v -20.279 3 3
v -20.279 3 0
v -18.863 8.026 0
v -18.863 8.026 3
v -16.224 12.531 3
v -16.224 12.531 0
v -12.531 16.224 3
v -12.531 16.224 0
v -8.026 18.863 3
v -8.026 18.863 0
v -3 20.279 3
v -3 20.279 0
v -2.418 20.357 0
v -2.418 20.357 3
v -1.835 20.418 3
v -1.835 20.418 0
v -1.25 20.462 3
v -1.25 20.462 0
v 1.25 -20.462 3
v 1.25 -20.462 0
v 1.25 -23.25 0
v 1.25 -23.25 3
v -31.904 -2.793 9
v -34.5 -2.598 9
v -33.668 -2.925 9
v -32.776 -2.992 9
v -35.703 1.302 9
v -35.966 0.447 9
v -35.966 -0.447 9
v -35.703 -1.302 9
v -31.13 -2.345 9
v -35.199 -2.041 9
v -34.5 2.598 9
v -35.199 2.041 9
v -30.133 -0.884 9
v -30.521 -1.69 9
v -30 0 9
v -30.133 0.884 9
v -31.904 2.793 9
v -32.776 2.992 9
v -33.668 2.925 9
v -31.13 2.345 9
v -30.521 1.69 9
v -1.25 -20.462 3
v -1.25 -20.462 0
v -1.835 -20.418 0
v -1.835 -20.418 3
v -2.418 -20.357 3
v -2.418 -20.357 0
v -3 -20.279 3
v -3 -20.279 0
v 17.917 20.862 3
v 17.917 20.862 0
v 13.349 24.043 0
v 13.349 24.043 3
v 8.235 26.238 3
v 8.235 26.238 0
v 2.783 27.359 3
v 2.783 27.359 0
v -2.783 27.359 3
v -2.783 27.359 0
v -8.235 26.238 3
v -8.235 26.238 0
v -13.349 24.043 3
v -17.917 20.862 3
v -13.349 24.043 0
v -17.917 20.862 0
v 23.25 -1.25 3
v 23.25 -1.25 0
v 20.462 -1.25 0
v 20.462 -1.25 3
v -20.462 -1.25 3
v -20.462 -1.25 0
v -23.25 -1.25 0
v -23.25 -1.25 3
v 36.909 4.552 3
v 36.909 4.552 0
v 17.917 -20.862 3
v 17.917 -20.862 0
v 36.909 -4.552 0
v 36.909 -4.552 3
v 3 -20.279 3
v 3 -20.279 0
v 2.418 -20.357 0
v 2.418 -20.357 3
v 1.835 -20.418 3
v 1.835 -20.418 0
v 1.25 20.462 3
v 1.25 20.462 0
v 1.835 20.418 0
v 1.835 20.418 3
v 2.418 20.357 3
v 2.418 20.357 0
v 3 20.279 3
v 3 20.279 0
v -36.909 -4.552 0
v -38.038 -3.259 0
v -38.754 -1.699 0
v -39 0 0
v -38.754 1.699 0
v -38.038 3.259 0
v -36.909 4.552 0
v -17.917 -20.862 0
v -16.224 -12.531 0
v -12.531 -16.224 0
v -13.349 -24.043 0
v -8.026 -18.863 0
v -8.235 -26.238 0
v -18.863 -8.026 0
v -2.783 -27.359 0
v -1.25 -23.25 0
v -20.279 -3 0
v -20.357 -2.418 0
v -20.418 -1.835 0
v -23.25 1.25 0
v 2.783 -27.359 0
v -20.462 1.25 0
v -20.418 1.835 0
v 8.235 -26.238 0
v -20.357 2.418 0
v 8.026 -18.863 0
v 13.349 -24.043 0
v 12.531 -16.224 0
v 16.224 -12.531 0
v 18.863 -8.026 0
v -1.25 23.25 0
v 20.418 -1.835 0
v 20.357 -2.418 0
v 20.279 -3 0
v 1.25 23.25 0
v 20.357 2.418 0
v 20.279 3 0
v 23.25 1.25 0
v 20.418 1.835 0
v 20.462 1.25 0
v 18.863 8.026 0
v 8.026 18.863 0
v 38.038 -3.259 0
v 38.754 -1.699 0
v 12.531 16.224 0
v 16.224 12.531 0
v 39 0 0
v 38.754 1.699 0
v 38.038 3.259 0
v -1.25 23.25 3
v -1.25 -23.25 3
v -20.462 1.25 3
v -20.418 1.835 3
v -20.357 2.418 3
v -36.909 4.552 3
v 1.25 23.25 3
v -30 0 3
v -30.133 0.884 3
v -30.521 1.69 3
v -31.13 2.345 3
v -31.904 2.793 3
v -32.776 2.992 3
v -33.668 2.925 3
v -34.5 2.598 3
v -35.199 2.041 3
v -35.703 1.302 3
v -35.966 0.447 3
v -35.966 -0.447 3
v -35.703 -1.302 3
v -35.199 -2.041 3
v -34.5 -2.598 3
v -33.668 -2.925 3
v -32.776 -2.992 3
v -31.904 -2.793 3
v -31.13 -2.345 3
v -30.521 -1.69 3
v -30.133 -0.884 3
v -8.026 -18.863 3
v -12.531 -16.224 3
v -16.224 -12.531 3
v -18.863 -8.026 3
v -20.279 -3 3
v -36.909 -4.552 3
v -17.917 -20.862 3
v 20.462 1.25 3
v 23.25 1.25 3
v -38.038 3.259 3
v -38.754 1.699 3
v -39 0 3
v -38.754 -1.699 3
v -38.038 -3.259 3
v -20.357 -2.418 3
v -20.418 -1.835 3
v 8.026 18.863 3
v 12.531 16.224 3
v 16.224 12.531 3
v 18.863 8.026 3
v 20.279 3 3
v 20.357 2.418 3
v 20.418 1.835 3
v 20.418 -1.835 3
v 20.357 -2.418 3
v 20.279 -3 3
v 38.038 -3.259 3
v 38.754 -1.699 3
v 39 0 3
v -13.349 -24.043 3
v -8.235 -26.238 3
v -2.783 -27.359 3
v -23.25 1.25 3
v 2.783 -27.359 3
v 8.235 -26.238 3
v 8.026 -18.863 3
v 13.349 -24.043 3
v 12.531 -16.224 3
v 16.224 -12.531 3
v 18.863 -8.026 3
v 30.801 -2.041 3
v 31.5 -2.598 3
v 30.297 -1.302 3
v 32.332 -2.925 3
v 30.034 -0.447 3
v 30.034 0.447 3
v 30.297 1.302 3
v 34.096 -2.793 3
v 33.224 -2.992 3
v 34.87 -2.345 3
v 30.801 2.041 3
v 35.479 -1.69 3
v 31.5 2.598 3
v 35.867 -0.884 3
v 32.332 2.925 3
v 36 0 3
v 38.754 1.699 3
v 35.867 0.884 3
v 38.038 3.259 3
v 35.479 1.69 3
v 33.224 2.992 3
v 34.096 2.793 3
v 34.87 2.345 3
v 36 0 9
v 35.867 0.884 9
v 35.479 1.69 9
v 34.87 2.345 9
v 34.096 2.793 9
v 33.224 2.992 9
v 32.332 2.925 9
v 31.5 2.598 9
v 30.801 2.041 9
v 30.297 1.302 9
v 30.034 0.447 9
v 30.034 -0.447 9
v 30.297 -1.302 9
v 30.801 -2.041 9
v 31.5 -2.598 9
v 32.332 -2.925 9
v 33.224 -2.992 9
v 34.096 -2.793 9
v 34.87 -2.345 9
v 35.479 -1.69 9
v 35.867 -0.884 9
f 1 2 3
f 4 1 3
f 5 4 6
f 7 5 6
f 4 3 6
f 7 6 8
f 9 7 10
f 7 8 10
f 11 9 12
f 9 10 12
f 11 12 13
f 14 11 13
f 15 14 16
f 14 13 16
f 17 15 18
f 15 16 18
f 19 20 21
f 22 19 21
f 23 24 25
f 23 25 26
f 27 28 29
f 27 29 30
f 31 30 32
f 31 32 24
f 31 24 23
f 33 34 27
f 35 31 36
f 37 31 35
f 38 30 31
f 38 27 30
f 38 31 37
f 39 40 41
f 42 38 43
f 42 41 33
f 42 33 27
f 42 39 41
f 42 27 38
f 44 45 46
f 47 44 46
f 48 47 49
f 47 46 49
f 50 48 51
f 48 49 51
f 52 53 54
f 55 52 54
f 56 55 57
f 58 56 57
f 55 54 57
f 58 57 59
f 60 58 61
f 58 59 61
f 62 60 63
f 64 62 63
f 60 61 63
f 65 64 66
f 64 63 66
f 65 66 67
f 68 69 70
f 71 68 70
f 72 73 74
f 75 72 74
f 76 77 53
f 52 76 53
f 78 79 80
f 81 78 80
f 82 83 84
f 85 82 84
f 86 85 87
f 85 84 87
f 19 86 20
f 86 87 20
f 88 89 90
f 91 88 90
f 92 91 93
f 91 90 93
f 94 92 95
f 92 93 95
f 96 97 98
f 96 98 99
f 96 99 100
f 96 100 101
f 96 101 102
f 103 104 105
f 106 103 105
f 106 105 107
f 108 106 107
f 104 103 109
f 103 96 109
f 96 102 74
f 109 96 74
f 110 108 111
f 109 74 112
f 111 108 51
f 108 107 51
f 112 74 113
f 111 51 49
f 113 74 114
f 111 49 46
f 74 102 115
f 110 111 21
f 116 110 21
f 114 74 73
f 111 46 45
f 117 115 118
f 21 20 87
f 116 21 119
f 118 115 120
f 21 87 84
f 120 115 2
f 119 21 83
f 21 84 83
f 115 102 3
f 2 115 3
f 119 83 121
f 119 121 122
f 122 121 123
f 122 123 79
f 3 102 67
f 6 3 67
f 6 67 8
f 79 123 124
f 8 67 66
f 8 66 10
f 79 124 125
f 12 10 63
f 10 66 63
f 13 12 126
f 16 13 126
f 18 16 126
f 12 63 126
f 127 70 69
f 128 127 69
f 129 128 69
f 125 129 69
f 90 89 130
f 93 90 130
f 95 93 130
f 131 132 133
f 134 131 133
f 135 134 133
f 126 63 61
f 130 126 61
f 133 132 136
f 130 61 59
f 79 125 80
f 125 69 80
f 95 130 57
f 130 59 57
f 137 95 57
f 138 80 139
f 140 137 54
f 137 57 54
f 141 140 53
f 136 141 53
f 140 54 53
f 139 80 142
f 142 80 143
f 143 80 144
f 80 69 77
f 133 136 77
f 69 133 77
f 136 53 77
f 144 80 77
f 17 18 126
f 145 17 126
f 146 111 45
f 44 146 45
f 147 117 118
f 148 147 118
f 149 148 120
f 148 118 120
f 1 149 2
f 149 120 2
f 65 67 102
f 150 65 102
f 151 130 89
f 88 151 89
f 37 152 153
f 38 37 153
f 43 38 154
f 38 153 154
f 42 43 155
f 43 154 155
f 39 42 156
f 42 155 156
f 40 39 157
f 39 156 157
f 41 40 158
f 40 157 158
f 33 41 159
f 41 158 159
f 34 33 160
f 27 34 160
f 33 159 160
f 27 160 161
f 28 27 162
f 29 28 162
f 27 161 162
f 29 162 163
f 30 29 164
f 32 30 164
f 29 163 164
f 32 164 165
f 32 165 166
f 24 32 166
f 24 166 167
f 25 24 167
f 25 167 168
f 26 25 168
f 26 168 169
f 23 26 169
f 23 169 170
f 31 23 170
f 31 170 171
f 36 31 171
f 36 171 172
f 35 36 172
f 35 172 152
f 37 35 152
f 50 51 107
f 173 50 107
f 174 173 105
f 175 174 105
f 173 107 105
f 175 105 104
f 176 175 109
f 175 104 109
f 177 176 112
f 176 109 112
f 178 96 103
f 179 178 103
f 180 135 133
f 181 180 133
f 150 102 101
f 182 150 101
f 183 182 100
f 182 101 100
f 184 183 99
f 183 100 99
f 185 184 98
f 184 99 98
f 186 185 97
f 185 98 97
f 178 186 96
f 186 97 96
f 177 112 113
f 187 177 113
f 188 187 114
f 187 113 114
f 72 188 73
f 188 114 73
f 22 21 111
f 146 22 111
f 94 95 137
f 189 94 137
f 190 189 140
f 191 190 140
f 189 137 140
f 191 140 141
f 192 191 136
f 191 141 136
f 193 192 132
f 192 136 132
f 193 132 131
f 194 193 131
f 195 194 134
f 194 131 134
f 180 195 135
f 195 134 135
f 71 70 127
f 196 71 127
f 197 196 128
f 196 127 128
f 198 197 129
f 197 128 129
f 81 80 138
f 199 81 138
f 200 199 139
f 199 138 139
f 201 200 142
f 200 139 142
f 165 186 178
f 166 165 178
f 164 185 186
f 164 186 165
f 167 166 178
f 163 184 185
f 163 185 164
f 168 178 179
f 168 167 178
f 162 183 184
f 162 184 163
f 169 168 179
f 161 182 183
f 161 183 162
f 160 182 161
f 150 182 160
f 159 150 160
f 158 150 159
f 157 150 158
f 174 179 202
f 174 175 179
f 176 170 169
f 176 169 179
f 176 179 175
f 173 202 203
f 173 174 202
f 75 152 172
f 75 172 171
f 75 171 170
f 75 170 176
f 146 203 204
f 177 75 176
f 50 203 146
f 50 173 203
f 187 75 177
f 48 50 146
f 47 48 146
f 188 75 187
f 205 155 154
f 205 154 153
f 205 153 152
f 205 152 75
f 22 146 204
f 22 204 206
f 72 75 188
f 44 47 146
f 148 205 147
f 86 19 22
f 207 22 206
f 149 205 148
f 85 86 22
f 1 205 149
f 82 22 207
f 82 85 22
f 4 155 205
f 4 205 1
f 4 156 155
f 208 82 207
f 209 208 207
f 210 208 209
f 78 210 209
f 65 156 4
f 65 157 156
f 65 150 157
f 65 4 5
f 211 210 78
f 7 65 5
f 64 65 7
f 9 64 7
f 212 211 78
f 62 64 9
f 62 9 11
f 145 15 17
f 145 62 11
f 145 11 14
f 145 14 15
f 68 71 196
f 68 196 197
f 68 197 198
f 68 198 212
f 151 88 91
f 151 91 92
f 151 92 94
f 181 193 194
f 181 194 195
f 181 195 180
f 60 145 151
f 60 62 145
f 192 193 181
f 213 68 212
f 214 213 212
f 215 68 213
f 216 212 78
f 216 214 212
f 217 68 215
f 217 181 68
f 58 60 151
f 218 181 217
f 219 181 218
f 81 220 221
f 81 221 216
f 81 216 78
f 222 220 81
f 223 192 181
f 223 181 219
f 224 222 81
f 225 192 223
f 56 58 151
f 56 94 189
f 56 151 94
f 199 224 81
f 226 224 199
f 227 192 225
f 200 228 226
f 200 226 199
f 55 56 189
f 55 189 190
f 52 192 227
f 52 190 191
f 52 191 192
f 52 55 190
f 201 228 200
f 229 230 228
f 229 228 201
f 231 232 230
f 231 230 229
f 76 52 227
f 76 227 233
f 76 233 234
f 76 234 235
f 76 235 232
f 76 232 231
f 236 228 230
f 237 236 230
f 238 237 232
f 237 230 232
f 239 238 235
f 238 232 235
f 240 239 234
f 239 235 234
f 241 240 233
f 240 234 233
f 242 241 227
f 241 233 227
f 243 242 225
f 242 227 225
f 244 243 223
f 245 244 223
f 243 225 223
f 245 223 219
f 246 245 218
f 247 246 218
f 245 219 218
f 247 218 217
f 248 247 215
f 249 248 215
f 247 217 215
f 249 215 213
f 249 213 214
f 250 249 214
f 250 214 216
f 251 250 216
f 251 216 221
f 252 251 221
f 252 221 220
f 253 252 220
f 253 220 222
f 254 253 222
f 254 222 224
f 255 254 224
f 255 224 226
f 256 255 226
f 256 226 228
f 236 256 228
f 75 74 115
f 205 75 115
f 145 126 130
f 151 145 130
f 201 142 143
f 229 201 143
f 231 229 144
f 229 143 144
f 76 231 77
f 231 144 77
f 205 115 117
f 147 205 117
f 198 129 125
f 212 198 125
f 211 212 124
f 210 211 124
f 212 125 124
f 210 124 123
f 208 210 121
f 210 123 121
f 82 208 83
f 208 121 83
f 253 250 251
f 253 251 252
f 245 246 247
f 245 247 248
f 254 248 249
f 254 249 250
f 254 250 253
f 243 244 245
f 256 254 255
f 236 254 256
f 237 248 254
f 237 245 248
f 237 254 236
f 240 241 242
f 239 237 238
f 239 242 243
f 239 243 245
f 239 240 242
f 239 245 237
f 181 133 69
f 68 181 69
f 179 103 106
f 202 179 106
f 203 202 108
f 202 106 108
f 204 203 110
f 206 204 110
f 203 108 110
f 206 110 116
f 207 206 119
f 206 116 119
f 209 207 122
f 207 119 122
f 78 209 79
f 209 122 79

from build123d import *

# Parameters (mm, degrees)
F0_R     = 3
F1_DEPTH = 3
F2_DEPTH = 9


with BuildPart() as f1:
    # F0 (on Top) → F1 (new body)
    with BuildSketch(Plane.XY):
        with BuildLine():
            ThreePointArc((27.4128787879, -2.1872532), (27, 0), (27.4128787879, 2.1872532))
            ThreePointArc((27.4128787879, 2.1872532), (24.5129138593, 12.4646321295), (17.916666852, 20.8624794527))
            ThreePointArc((17.916666852, 20.8624794527), (2.047e-07, 27.5), (-17.9166665414, 20.8624797195))
            ThreePointArc((-17.9166665414, 20.8624797195), (-24.5129137666, 12.464632312), (-27.4128787879, 2.1872532))
            ThreePointArc((-27.4128787879, 2.1872532), (-27.1041231665, 1.1129404133), (-27, 0))
            ThreePointArc((-27, 0), (-27.1041231665, -1.1129404133), (-27.4128787879, -2.1872532))
            ThreePointArc((-27.4128787879, -2.1872532), (-24.5129136468, -12.4646325475), (-17.9166661404, -20.8624800638))
            ThreePointArc((-17.9166661404, -20.8624800638), (2.794e-07, -27.5), (17.9166665643, -20.8624796998))
            ThreePointArc((17.9166665643, -20.8624796998), (24.5129137734, -12.4646322985), (27.4128787879, -2.1872532))
        make_face()
        with BuildLine():
            ThreePointArc((3, 20.2792997907), (14.4956890143, 14.4956890143), (20.2792997907, 3))
            Line((20.2792997907, 3), (25, 3))
            Line((25, 3), (25, -3))
            Line((25, -3), (20.2792997907, -3))
            ThreePointArc((20.2792997907, -3), (14.4956890143, -14.4956890143), (3, -20.2792997907))
            Line((3, -20.2792997907), (3, -25))
            Line((3, -25), (-3, -25))
            Line((-3, -25), (-3, -20.2792997907))
            ThreePointArc((-3, -20.2792997907), (-14.4956890143, -14.4956890143), (-20.2792997907, -3))
            Line((-20.2792997907, -3), (-25, -3))
            Line((-25, -3), (-25, 3))
            Line((-25, 3), (-20.2792997907, 3))
            ThreePointArc((-20.2792997907, 3), (-14.4956890143, 14.4956890143), (-3, 20.2792997907))
            Line((-3, 20.2792997907), (-3, 25))
            Line((-3, 25), (3, 25))
            Line((3, 25), (3, 20.2792997907))
        make_face(mode=Mode.SUBTRACT)
        with BuildLine():
            ThreePointArc((-27.4128787879, 2.1872532), (-24.5129137666, 12.464632312), (-17.9166665414, 20.8624797195))
            Line((-17.9166665414, 20.8624797195), (-36.9090909114, 4.5518137315))
            ThreePointArc((-36.9090909114, 4.5518137315), (-31.5502644899, 5.8222218225), (-27.4128787879, 2.1872532))
        make_face()
        with BuildLine():
            ThreePointArc((-27.4128787879, -2.1872532), (-27.5, 0), (-27.4128787879, 2.1872532))
            ThreePointArc((-27.4128787879, 2.1872532), (-31.5502644899, 5.8222218225), (-36.9090909114, 4.5518137315))
            ThreePointArc((-36.9090909114, 4.5518137315), (-39, 5.6e-09), (-36.9090909199, -4.5518137242))
            ThreePointArc((-36.9090909199, -4.5518137242), (-31.5502644953, -5.8222218239), (-27.4128787879, -2.1872532))
        make_face()
        with Locations((-33, 0)):
            Circle(F0_R, mode=Mode.SUBTRACT)
        with Locations((-33, 0)):
            Circle(F0_R)
        with BuildLine():
            Line((-36.9090909199, -4.5518137242), (-17.9166661404, -20.8624800638))
            ThreePointArc((-17.9166661404, -20.8624800638), (-24.5129136468, -12.4646325475), (-27.4128787879, -2.1872532))
            ThreePointArc((-27.4128787879, -2.1872532), (-31.5502644953, -5.8222218239), (-36.9090909199, -4.5518137242))
        make_face()
        with BuildLine():
            ThreePointArc((27.4128787879, 2.1872532), (27.478211065, 1.0944937947), (27.5, 0))
            ThreePointArc((27.5, 0), (27.478211065, -1.0944937947), (27.4128787879, -2.1872532))
            ThreePointArc((27.4128787879, -2.1872532), (31.5502644944, -5.8222218236), (36.9090909184, -4.5518137255))
            ThreePointArc((36.9090909184, -4.5518137255), (38.4522722562, -2.5045413242), (39, 0))
            ThreePointArc((39, 0), (38.4522722545, 2.5045413278), (36.9090909125, 4.5518137306))
            ThreePointArc((36.9090909125, 4.5518137306), (31.5502644906, 5.8222218227), (27.4128787879, 2.1872532))
        make_face()
        with Locations((33, 0)):
            Circle(F0_R, mode=Mode.SUBTRACT)
        with Locations((33, 0)):
            Circle(F0_R)
        with BuildLine():
            ThreePointArc((36.9090909184, -4.5518137255), (31.5502644944, -5.8222218236), (27.4128787879, -2.1872532))
            ThreePointArc((27.4128787879, -2.1872532), (24.5129137734, -12.4646322985), (17.9166665643, -20.8624796998))
            Line((17.9166665643, -20.8624796998), (36.9090909184, -4.5518137255))
        make_face()
        with BuildLine():
            ThreePointArc((17.916666852, 20.8624794527), (24.5129138593, 12.4646321295), (27.4128787879, 2.1872532))
            ThreePointArc((27.4128787879, 2.1872532), (31.5502644906, 5.8222218227), (36.9090909125, 4.5518137306))
            Line((36.9090909125, 4.5518137306), (17.916666852, 20.8624794527))
        make_face()
        with BuildLine():
            ThreePointArc((27.4128787879, -2.1872532), (27.478211065, -1.0944937947), (27.5, 0))
            ThreePointArc((27.5, 0), (27.478211065, 1.0944937947), (27.4128787879, 2.1872532))
            ThreePointArc((27.4128787879, 2.1872532), (27, 0), (27.4128787879, -2.1872532))
        make_face()
        with BuildLine():
            ThreePointArc((-27, 0), (-27.1041231665, 1.1129404133), (-27.4128787879, 2.1872532))
            ThreePointArc((-27.4128787879, 2.1872532), (-27.5, 0), (-27.4128787879, -2.1872532))
            ThreePointArc((-27.4128787879, -2.1872532), (-27.1041231665, -1.1129404133), (-27, 0))
        make_face()
        with BuildLine():
            ThreePointArc((1.25, 20.4618547546), (2.126959468, 20.3893610351), (3, 20.2792997907))
            Line((3, 20.2792997907), (3, 25))
            Line((3, 25), (-3, 25))
            Line((-3, 25), (-3, 20.2792997907))
            ThreePointArc((-3, 20.2792997907), (-2.126959468, 20.3893610351), (-1.25, 20.4618547546))
            Line((-1.25, 20.4618547546), (-1.25, 23.25))
            Line((-1.25, 23.25), (1.25, 23.25))
            Line((1.25, 23.25), (1.25, 20.4618547546))
        make_face()
        with BuildLine():
            Line((-23.25, 1.25), (-20.4618547546, 1.25))
            ThreePointArc((-20.4618547546, 1.25), (-20.3893610351, 2.126959468), (-20.2792997907, 3))
            Line((-20.2792997907, 3), (-25, 3))
            Line((-25, 3), (-25, -3))
            Line((-25, -3), (-20.2792997907, -3))
            ThreePointArc((-20.2792997907, -3), (-20.3893610351, -2.126959468), (-20.4618547546, -1.25))
            Line((-20.4618547546, -1.25), (-23.25, -1.25))
            Line((-23.25, -1.25), (-23.25, 1.25))
        make_face()
        with BuildLine():
            Line((3, -25), (3, -20.2792997907))
            ThreePointArc((3, -20.2792997907), (2.126959468, -20.3893610351), (1.25, -20.4618547546))
            Line((1.25, -20.4618547546), (1.25, -23.25))
            Line((1.25, -23.25), (-1.25, -23.25))
            Line((-1.25, -23.25), (-1.25, -20.4618547546))
            ThreePointArc((-1.25, -20.4618547546), (-2.126959468, -20.3893610351), (-3, -20.2792997907))
            Line((-3, -20.2792997907), (-3, -25))
            Line((-3, -25), (3, -25))
        make_face()
        with BuildLine():
            ThreePointArc((20.2792997907, 3), (20.3893610351, 2.126959468), (20.4618547546, 1.25))
            Line((20.4618547546, 1.25), (23.25, 1.25))
            Line((23.25, 1.25), (23.25, -1.25))
            Line((23.25, -1.25), (20.4618547546, -1.25))
            ThreePointArc((20.4618547546, -1.25), (20.3893610351, -2.126959468), (20.2792997907, -3))
            Line((20.2792997907, -3), (25, -3))
            Line((25, -3), (25, 3))
            Line((25, 3), (20.2792997907, 3))
        make_face()
    extrude(amount=F1_DEPTH)

    # F0 (on Top) → F2 (join)
    with BuildSketch(Plane.XY):
        with Locations((-33, 0)):
            Circle(F0_R)
        with Locations((33, 0)):
            Circle(F0_R)
    extrude(amount=F2_DEPTH)


solid = f1.part
